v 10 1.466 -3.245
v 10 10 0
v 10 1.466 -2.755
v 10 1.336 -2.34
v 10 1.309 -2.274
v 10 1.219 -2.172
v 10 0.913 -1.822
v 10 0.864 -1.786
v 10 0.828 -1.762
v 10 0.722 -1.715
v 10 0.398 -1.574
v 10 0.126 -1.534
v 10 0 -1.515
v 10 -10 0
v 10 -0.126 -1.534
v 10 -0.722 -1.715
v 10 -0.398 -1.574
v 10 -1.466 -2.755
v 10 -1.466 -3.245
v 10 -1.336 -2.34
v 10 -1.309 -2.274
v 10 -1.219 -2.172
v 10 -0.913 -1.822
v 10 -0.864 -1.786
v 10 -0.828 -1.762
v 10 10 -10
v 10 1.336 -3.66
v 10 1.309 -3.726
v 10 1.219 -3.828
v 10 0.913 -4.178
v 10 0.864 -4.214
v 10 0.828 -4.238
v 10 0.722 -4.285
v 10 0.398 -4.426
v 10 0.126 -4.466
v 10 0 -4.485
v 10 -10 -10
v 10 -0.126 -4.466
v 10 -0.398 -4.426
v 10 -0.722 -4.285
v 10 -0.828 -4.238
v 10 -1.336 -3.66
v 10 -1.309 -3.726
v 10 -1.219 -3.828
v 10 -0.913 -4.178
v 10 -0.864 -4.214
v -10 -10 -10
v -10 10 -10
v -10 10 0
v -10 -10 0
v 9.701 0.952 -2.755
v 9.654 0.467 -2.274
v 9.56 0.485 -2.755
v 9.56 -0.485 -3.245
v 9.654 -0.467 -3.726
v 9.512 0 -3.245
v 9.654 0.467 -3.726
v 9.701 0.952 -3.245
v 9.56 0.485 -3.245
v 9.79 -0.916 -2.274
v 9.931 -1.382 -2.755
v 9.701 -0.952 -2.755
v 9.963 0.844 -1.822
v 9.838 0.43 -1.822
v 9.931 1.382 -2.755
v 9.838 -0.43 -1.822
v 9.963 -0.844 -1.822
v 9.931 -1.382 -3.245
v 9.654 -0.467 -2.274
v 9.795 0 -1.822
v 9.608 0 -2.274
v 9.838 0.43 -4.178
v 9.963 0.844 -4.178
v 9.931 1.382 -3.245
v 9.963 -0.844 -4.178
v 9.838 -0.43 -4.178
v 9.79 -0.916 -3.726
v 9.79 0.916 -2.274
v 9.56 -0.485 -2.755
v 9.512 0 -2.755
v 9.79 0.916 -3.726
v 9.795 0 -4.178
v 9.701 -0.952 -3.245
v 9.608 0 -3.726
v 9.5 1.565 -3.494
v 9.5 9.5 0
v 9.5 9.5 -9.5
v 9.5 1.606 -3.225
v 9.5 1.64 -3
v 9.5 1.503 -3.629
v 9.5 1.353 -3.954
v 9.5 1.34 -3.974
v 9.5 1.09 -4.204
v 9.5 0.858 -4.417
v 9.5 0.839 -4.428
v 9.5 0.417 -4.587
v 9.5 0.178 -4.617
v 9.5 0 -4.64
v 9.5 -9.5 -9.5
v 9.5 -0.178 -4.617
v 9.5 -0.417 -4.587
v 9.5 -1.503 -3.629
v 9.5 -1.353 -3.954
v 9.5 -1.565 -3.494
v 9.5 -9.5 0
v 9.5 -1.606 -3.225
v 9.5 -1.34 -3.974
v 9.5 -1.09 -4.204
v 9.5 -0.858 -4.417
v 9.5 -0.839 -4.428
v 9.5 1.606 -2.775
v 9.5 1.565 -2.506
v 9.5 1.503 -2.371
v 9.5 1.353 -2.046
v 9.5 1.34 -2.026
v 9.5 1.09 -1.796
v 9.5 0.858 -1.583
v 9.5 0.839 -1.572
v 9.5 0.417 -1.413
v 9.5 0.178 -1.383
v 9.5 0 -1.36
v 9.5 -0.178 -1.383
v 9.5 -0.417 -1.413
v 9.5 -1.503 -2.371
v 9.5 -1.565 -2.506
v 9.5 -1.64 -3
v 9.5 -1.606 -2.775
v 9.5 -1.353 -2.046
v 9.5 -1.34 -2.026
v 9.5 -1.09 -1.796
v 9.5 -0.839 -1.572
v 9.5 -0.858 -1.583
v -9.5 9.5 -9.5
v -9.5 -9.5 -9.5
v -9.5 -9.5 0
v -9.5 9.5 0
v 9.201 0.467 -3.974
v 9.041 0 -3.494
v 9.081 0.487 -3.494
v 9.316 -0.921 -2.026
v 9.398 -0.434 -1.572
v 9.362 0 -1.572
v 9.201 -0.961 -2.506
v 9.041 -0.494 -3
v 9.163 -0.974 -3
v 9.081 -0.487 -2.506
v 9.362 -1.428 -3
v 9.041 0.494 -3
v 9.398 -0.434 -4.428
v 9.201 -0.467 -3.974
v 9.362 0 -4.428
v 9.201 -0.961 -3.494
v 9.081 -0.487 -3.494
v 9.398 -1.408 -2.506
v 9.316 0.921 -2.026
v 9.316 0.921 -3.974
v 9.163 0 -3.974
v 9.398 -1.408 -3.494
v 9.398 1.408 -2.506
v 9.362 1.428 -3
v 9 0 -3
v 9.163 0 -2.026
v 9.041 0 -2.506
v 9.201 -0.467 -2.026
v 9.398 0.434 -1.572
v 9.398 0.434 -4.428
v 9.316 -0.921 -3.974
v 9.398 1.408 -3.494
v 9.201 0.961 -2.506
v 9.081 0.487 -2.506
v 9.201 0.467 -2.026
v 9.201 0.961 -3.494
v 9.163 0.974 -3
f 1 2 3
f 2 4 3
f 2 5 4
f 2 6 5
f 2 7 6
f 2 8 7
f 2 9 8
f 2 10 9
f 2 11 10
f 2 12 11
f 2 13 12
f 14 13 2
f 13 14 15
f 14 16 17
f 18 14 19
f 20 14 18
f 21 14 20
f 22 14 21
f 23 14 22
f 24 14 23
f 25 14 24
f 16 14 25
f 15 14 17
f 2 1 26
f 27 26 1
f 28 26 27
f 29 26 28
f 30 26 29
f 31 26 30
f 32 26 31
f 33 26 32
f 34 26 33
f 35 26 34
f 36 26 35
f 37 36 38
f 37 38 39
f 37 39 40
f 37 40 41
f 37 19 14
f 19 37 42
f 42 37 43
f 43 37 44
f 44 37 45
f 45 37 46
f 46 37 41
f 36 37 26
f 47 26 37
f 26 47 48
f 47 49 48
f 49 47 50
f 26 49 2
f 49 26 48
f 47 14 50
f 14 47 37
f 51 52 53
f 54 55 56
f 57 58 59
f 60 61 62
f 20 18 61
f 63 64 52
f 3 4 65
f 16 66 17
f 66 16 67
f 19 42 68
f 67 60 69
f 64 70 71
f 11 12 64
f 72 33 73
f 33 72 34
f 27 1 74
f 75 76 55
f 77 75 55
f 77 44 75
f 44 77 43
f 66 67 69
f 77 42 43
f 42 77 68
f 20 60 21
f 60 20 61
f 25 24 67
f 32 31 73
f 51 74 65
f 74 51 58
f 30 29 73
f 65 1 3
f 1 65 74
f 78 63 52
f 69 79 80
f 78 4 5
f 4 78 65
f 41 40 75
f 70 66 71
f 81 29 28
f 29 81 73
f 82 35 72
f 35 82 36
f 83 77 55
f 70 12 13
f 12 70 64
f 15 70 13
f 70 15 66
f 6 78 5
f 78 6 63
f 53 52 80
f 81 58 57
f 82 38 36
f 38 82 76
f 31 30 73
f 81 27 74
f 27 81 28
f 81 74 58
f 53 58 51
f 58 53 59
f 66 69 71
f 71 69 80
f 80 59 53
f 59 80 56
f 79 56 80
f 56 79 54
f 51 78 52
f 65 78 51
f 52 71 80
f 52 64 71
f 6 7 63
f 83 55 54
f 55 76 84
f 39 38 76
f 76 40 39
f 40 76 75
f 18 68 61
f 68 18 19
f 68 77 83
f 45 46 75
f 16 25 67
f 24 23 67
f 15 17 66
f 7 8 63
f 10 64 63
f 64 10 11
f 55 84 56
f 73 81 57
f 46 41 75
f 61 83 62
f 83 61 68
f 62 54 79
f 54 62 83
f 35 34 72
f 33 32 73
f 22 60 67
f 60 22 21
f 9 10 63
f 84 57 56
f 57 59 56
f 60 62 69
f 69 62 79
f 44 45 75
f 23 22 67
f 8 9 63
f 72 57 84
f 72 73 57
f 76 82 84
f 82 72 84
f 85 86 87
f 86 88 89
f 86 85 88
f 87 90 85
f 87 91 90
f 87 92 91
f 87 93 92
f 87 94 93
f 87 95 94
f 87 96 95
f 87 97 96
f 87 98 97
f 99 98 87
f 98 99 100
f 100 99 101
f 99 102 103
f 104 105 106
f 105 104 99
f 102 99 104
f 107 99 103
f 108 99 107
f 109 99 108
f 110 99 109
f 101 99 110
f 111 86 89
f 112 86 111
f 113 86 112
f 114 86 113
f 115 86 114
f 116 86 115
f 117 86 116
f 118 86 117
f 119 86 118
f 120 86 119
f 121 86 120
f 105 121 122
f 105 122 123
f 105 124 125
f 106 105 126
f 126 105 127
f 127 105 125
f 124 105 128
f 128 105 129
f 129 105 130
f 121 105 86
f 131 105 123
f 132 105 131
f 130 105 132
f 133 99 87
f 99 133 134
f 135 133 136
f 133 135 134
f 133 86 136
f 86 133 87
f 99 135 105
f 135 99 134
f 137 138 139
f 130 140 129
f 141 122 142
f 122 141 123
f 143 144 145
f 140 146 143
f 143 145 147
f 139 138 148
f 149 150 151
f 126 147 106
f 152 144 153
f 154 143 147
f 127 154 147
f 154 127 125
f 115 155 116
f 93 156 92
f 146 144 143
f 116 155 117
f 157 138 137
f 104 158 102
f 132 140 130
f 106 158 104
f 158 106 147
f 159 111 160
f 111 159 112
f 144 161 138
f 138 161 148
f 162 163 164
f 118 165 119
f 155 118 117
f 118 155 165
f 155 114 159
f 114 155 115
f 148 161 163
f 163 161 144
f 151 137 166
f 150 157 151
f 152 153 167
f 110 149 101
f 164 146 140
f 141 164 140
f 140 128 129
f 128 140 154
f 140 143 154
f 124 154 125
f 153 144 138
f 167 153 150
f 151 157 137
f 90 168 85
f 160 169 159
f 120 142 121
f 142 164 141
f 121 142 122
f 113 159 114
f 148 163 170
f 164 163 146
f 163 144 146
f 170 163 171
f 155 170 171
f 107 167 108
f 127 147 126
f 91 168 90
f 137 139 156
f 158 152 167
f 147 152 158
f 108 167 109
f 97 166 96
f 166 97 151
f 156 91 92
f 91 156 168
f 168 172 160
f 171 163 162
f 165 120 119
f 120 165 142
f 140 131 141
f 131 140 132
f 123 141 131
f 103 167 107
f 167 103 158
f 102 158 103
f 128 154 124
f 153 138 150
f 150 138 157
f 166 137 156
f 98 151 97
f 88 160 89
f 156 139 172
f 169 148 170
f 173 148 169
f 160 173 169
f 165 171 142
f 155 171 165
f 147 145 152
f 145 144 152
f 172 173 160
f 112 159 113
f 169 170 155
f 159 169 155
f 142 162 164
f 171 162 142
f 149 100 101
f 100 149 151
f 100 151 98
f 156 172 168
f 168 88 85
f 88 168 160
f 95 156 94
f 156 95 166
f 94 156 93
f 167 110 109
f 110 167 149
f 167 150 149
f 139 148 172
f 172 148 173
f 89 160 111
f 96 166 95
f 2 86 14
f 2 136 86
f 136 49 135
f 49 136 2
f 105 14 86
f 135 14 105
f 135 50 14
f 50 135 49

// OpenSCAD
// file: orient_to.scad
$fn=35;

module orient_to(origin, normal) {   
      translate(origin)
      rotate([0, 0, atan2(normal.y, normal.x)]) //rotation
      rotate([0, atan2(sqrt(pow(normal.x, 2)+pow(normal.y, 2)),normal.z), 0])
      children();
}


// testing
//pointA = [1,0,5];
//pointB = [1,3,7];
//
//color([1,0,0])translate(pointA) sphere(r=0.1);
//
//color([0,0,1])translate(pointB)sphere(r=0.1);
//
//orient_to(pointA,pointB-pointA)cylinder(r=0.1,h=norm(pointB-pointA));
// file: arrayPolar.scad
//arrayPolar
//arrayPolar( count, arc, radius, rotation, tilt)

module arrayPolar(count = 1, arc = 360, radius = 1,rotation = 0, tilt = 0 ){
  for (i = [0 : count - 1]){
    angle = arc / count * i;
    echo("angle =" , angle);
    rotate([0,0,rotation])
    translate(radius * [sin(angle),-cos(angle),0])
    rotate(tilt * [-cos(angle) ,-sin(angle), 0])
    rotate([0,0,angle-90])
    children();
  } 
}
// file: sphere_functions.scad
// functions for working with sphere surfaces in openscad
// 
$fn = 12;
eps = 0.01;

use <orient_to.scad>
// given lat and long pair, output xyz cartesian coord 

// converts lat long to cartesian
// todo: add validators for latitude (values between [-90:90] and longitud[-180:180]
function latlong_to_cartesian(lat,lon,r) = [ r*cos(lat)*cos(lon),r*cos(lat)*sin(lon), r*sin(lat) ];

// converts polar to cartesian
//  phi = polar or zenith angle or colatitude, theta = azimuthal, or projection on XY, r = radius
function spherical_polar_to_cartesian(phi,theta,r) = [ r*sin(phi)*cos(theta),r*sin(phi)*sin(theta), r*cos(phi) ];

// uniform distribution on a sphere, valid inputs only between 0 1 
// todo: add validator for x between 0 and 1
function sphere_uniform_dist(x) = acos(2*x - 1);

// given radius and an n sided polyhedra, return points in every grid of area A = 4*Pi*r^2
// given a radius and number of points, gives a grid of regularly spaced x,y,z points
function sphere_ngon_points(radius,ngon_vertices) = spherical_polar_to_cartesian(0,360/num_points,radius);

// todo:  add functions to output efficient arrays to be used in poission disc distributions
// add functions for mitchell's algorithim for poission disc distribution


// testing output, decomment to test
//echo("latlong_to_cartesian(0,0,1)", latlong_to_cartesian(0,0,1));
//sphere(ball_radius);
//#translate(latlong_to_cartesian(30,180,ball_radius))sphere(r=1);

ball_radius = 20;
little_ball_radius = 0.1;
little_circle_radius = 2;
height = 20;
shell_thickness = 0.5;
iterations = 525;
seed = 42;
thetans = rands(-180,180,iterations,seed);
phis = rands(0,180,iterations,seed*2);
r_vect_3 = rands(0,1,iterations,seed*2);

// cones randomly placed on a sphere 
    for(i=[0:iterations-1])
    {
     color([i/526,i/526,0])orient_to(spherical_polar_to_cartesian(sphere_uniform_dist(r_vect_3[i]),thetans[i],ball_radius),spherical_polar_to_cartesian(sphere_uniform_dist(r_vect_3[i]),thetans[i],ball_radius))cylinder(r1=little_circle_radius,r2=0.01,h=height);
    }



// some work with curved slices of spheres
//difference(){
//  union(){
//    for(i=[0:iterations-1])
//    {
//      translate(sphercial_polar_to_cartesian(uniform_dist(r_vect_3[i]),thetans[i],ball_radius))sphere(little_ball_radius);
//    }
//  }
//    sphere(ball_radius-shell_thickness/2);
//  union(){
//    difference(){
//      sphere(ball_radius+little_ball_radius*2);
//      sphere(ball_radius+shell_thickness/2);
//    }
//  }
//}
// main file
use <sphere_functions.scad>
use <arrayPolar.scad>
$fa=5.0;
$fs=0.5;
//$fn= 00;
eps = 0.05;
print_offset = 0.3;
function sphere_radius_from_cap(height, diameter) = (pow(height,2) + pow(diameter/2,2) ) /(2*height);

module orient_to(coordinate, normal) {   
      translate(coordinate)
      rotate([0, 0, atan2(normal.y, normal.x)]) //rotation
      rotate([0, atan2(sqrt(pow(normal.x, 2)+pow(normal.y, 2)),normal.z), 0])
      children();
}

// module takes inputs height (any position along radius), diameter, and 
// thickness, and outputs a 'spherical cap' 
module spherical_cap (height , diameter){
    this_radius = sphere_radius_from_cap(height,diameter);
    intersection(){
      translate([0,0,height - this_radius])sphere(this_radius);
      difference(){
      translate([0,0,this_radius*2.1/2]) cube(this_radius*2.1,center=true);
      //%translate([0,0,this_radius*2.1/2]) cylinder(diameter*1.01, h = this_radius * 2, center=true);
      translate([0,0,-this_radius*2.1/2]) cylinder(r=0.90*diameter/2,  h = this_radius * 2.1, center = true);
      }
    }
}

// module takes inputs (height [a position along the radius]), diameter, thickness), and outputs a dome 
module spherical_cap_shell (height , diameter, thickness){
    radius = sphere_radius_from_cap(height,diameter);
      cube(diameter*1.1,center=true);
    difference(){
      color("blue")translate([0,0, height - radius])
      sphere(radius);

      color("red")translate([0,0, height - (radius - thickness) ])
      sphere(radius - thickness );
    }
    }


// needs some uniform symmetry around the origin. works with centered solids
module sphere_detent_children(detent_radius, detent_depth, coordinate, normal , child_size, shell_thickness){
    intersection(){
	difference(){
          difference(){
            children();
            orient_to(coordinate,normal)sphere(r=detent_radius);
          }
          difference(){
            scale([1-shell_thickness/child_size, 1-shell_thickness/child_size,1-shell_thickness/child_size])children();
            orient_to(coordinate,normal)sphere(r=detent_radius+shell_thickness/2);
          }
	}
    }
}


module anim(t) {
    difference(){
        sphere_detent_children(2.5, 1,[12*cos(t*360),12*sin(t*360),sin(t*180)-3], [0,0,0], 20, 1) cube([20,20,20],center=true);
        translate([0,0,10])cube([40,40,20],center=true);
    }
}

module anim_sim(){
anim(0.1);
anim(0.5);
anim(0.9);
}


//anim_sim();
anim($t);
